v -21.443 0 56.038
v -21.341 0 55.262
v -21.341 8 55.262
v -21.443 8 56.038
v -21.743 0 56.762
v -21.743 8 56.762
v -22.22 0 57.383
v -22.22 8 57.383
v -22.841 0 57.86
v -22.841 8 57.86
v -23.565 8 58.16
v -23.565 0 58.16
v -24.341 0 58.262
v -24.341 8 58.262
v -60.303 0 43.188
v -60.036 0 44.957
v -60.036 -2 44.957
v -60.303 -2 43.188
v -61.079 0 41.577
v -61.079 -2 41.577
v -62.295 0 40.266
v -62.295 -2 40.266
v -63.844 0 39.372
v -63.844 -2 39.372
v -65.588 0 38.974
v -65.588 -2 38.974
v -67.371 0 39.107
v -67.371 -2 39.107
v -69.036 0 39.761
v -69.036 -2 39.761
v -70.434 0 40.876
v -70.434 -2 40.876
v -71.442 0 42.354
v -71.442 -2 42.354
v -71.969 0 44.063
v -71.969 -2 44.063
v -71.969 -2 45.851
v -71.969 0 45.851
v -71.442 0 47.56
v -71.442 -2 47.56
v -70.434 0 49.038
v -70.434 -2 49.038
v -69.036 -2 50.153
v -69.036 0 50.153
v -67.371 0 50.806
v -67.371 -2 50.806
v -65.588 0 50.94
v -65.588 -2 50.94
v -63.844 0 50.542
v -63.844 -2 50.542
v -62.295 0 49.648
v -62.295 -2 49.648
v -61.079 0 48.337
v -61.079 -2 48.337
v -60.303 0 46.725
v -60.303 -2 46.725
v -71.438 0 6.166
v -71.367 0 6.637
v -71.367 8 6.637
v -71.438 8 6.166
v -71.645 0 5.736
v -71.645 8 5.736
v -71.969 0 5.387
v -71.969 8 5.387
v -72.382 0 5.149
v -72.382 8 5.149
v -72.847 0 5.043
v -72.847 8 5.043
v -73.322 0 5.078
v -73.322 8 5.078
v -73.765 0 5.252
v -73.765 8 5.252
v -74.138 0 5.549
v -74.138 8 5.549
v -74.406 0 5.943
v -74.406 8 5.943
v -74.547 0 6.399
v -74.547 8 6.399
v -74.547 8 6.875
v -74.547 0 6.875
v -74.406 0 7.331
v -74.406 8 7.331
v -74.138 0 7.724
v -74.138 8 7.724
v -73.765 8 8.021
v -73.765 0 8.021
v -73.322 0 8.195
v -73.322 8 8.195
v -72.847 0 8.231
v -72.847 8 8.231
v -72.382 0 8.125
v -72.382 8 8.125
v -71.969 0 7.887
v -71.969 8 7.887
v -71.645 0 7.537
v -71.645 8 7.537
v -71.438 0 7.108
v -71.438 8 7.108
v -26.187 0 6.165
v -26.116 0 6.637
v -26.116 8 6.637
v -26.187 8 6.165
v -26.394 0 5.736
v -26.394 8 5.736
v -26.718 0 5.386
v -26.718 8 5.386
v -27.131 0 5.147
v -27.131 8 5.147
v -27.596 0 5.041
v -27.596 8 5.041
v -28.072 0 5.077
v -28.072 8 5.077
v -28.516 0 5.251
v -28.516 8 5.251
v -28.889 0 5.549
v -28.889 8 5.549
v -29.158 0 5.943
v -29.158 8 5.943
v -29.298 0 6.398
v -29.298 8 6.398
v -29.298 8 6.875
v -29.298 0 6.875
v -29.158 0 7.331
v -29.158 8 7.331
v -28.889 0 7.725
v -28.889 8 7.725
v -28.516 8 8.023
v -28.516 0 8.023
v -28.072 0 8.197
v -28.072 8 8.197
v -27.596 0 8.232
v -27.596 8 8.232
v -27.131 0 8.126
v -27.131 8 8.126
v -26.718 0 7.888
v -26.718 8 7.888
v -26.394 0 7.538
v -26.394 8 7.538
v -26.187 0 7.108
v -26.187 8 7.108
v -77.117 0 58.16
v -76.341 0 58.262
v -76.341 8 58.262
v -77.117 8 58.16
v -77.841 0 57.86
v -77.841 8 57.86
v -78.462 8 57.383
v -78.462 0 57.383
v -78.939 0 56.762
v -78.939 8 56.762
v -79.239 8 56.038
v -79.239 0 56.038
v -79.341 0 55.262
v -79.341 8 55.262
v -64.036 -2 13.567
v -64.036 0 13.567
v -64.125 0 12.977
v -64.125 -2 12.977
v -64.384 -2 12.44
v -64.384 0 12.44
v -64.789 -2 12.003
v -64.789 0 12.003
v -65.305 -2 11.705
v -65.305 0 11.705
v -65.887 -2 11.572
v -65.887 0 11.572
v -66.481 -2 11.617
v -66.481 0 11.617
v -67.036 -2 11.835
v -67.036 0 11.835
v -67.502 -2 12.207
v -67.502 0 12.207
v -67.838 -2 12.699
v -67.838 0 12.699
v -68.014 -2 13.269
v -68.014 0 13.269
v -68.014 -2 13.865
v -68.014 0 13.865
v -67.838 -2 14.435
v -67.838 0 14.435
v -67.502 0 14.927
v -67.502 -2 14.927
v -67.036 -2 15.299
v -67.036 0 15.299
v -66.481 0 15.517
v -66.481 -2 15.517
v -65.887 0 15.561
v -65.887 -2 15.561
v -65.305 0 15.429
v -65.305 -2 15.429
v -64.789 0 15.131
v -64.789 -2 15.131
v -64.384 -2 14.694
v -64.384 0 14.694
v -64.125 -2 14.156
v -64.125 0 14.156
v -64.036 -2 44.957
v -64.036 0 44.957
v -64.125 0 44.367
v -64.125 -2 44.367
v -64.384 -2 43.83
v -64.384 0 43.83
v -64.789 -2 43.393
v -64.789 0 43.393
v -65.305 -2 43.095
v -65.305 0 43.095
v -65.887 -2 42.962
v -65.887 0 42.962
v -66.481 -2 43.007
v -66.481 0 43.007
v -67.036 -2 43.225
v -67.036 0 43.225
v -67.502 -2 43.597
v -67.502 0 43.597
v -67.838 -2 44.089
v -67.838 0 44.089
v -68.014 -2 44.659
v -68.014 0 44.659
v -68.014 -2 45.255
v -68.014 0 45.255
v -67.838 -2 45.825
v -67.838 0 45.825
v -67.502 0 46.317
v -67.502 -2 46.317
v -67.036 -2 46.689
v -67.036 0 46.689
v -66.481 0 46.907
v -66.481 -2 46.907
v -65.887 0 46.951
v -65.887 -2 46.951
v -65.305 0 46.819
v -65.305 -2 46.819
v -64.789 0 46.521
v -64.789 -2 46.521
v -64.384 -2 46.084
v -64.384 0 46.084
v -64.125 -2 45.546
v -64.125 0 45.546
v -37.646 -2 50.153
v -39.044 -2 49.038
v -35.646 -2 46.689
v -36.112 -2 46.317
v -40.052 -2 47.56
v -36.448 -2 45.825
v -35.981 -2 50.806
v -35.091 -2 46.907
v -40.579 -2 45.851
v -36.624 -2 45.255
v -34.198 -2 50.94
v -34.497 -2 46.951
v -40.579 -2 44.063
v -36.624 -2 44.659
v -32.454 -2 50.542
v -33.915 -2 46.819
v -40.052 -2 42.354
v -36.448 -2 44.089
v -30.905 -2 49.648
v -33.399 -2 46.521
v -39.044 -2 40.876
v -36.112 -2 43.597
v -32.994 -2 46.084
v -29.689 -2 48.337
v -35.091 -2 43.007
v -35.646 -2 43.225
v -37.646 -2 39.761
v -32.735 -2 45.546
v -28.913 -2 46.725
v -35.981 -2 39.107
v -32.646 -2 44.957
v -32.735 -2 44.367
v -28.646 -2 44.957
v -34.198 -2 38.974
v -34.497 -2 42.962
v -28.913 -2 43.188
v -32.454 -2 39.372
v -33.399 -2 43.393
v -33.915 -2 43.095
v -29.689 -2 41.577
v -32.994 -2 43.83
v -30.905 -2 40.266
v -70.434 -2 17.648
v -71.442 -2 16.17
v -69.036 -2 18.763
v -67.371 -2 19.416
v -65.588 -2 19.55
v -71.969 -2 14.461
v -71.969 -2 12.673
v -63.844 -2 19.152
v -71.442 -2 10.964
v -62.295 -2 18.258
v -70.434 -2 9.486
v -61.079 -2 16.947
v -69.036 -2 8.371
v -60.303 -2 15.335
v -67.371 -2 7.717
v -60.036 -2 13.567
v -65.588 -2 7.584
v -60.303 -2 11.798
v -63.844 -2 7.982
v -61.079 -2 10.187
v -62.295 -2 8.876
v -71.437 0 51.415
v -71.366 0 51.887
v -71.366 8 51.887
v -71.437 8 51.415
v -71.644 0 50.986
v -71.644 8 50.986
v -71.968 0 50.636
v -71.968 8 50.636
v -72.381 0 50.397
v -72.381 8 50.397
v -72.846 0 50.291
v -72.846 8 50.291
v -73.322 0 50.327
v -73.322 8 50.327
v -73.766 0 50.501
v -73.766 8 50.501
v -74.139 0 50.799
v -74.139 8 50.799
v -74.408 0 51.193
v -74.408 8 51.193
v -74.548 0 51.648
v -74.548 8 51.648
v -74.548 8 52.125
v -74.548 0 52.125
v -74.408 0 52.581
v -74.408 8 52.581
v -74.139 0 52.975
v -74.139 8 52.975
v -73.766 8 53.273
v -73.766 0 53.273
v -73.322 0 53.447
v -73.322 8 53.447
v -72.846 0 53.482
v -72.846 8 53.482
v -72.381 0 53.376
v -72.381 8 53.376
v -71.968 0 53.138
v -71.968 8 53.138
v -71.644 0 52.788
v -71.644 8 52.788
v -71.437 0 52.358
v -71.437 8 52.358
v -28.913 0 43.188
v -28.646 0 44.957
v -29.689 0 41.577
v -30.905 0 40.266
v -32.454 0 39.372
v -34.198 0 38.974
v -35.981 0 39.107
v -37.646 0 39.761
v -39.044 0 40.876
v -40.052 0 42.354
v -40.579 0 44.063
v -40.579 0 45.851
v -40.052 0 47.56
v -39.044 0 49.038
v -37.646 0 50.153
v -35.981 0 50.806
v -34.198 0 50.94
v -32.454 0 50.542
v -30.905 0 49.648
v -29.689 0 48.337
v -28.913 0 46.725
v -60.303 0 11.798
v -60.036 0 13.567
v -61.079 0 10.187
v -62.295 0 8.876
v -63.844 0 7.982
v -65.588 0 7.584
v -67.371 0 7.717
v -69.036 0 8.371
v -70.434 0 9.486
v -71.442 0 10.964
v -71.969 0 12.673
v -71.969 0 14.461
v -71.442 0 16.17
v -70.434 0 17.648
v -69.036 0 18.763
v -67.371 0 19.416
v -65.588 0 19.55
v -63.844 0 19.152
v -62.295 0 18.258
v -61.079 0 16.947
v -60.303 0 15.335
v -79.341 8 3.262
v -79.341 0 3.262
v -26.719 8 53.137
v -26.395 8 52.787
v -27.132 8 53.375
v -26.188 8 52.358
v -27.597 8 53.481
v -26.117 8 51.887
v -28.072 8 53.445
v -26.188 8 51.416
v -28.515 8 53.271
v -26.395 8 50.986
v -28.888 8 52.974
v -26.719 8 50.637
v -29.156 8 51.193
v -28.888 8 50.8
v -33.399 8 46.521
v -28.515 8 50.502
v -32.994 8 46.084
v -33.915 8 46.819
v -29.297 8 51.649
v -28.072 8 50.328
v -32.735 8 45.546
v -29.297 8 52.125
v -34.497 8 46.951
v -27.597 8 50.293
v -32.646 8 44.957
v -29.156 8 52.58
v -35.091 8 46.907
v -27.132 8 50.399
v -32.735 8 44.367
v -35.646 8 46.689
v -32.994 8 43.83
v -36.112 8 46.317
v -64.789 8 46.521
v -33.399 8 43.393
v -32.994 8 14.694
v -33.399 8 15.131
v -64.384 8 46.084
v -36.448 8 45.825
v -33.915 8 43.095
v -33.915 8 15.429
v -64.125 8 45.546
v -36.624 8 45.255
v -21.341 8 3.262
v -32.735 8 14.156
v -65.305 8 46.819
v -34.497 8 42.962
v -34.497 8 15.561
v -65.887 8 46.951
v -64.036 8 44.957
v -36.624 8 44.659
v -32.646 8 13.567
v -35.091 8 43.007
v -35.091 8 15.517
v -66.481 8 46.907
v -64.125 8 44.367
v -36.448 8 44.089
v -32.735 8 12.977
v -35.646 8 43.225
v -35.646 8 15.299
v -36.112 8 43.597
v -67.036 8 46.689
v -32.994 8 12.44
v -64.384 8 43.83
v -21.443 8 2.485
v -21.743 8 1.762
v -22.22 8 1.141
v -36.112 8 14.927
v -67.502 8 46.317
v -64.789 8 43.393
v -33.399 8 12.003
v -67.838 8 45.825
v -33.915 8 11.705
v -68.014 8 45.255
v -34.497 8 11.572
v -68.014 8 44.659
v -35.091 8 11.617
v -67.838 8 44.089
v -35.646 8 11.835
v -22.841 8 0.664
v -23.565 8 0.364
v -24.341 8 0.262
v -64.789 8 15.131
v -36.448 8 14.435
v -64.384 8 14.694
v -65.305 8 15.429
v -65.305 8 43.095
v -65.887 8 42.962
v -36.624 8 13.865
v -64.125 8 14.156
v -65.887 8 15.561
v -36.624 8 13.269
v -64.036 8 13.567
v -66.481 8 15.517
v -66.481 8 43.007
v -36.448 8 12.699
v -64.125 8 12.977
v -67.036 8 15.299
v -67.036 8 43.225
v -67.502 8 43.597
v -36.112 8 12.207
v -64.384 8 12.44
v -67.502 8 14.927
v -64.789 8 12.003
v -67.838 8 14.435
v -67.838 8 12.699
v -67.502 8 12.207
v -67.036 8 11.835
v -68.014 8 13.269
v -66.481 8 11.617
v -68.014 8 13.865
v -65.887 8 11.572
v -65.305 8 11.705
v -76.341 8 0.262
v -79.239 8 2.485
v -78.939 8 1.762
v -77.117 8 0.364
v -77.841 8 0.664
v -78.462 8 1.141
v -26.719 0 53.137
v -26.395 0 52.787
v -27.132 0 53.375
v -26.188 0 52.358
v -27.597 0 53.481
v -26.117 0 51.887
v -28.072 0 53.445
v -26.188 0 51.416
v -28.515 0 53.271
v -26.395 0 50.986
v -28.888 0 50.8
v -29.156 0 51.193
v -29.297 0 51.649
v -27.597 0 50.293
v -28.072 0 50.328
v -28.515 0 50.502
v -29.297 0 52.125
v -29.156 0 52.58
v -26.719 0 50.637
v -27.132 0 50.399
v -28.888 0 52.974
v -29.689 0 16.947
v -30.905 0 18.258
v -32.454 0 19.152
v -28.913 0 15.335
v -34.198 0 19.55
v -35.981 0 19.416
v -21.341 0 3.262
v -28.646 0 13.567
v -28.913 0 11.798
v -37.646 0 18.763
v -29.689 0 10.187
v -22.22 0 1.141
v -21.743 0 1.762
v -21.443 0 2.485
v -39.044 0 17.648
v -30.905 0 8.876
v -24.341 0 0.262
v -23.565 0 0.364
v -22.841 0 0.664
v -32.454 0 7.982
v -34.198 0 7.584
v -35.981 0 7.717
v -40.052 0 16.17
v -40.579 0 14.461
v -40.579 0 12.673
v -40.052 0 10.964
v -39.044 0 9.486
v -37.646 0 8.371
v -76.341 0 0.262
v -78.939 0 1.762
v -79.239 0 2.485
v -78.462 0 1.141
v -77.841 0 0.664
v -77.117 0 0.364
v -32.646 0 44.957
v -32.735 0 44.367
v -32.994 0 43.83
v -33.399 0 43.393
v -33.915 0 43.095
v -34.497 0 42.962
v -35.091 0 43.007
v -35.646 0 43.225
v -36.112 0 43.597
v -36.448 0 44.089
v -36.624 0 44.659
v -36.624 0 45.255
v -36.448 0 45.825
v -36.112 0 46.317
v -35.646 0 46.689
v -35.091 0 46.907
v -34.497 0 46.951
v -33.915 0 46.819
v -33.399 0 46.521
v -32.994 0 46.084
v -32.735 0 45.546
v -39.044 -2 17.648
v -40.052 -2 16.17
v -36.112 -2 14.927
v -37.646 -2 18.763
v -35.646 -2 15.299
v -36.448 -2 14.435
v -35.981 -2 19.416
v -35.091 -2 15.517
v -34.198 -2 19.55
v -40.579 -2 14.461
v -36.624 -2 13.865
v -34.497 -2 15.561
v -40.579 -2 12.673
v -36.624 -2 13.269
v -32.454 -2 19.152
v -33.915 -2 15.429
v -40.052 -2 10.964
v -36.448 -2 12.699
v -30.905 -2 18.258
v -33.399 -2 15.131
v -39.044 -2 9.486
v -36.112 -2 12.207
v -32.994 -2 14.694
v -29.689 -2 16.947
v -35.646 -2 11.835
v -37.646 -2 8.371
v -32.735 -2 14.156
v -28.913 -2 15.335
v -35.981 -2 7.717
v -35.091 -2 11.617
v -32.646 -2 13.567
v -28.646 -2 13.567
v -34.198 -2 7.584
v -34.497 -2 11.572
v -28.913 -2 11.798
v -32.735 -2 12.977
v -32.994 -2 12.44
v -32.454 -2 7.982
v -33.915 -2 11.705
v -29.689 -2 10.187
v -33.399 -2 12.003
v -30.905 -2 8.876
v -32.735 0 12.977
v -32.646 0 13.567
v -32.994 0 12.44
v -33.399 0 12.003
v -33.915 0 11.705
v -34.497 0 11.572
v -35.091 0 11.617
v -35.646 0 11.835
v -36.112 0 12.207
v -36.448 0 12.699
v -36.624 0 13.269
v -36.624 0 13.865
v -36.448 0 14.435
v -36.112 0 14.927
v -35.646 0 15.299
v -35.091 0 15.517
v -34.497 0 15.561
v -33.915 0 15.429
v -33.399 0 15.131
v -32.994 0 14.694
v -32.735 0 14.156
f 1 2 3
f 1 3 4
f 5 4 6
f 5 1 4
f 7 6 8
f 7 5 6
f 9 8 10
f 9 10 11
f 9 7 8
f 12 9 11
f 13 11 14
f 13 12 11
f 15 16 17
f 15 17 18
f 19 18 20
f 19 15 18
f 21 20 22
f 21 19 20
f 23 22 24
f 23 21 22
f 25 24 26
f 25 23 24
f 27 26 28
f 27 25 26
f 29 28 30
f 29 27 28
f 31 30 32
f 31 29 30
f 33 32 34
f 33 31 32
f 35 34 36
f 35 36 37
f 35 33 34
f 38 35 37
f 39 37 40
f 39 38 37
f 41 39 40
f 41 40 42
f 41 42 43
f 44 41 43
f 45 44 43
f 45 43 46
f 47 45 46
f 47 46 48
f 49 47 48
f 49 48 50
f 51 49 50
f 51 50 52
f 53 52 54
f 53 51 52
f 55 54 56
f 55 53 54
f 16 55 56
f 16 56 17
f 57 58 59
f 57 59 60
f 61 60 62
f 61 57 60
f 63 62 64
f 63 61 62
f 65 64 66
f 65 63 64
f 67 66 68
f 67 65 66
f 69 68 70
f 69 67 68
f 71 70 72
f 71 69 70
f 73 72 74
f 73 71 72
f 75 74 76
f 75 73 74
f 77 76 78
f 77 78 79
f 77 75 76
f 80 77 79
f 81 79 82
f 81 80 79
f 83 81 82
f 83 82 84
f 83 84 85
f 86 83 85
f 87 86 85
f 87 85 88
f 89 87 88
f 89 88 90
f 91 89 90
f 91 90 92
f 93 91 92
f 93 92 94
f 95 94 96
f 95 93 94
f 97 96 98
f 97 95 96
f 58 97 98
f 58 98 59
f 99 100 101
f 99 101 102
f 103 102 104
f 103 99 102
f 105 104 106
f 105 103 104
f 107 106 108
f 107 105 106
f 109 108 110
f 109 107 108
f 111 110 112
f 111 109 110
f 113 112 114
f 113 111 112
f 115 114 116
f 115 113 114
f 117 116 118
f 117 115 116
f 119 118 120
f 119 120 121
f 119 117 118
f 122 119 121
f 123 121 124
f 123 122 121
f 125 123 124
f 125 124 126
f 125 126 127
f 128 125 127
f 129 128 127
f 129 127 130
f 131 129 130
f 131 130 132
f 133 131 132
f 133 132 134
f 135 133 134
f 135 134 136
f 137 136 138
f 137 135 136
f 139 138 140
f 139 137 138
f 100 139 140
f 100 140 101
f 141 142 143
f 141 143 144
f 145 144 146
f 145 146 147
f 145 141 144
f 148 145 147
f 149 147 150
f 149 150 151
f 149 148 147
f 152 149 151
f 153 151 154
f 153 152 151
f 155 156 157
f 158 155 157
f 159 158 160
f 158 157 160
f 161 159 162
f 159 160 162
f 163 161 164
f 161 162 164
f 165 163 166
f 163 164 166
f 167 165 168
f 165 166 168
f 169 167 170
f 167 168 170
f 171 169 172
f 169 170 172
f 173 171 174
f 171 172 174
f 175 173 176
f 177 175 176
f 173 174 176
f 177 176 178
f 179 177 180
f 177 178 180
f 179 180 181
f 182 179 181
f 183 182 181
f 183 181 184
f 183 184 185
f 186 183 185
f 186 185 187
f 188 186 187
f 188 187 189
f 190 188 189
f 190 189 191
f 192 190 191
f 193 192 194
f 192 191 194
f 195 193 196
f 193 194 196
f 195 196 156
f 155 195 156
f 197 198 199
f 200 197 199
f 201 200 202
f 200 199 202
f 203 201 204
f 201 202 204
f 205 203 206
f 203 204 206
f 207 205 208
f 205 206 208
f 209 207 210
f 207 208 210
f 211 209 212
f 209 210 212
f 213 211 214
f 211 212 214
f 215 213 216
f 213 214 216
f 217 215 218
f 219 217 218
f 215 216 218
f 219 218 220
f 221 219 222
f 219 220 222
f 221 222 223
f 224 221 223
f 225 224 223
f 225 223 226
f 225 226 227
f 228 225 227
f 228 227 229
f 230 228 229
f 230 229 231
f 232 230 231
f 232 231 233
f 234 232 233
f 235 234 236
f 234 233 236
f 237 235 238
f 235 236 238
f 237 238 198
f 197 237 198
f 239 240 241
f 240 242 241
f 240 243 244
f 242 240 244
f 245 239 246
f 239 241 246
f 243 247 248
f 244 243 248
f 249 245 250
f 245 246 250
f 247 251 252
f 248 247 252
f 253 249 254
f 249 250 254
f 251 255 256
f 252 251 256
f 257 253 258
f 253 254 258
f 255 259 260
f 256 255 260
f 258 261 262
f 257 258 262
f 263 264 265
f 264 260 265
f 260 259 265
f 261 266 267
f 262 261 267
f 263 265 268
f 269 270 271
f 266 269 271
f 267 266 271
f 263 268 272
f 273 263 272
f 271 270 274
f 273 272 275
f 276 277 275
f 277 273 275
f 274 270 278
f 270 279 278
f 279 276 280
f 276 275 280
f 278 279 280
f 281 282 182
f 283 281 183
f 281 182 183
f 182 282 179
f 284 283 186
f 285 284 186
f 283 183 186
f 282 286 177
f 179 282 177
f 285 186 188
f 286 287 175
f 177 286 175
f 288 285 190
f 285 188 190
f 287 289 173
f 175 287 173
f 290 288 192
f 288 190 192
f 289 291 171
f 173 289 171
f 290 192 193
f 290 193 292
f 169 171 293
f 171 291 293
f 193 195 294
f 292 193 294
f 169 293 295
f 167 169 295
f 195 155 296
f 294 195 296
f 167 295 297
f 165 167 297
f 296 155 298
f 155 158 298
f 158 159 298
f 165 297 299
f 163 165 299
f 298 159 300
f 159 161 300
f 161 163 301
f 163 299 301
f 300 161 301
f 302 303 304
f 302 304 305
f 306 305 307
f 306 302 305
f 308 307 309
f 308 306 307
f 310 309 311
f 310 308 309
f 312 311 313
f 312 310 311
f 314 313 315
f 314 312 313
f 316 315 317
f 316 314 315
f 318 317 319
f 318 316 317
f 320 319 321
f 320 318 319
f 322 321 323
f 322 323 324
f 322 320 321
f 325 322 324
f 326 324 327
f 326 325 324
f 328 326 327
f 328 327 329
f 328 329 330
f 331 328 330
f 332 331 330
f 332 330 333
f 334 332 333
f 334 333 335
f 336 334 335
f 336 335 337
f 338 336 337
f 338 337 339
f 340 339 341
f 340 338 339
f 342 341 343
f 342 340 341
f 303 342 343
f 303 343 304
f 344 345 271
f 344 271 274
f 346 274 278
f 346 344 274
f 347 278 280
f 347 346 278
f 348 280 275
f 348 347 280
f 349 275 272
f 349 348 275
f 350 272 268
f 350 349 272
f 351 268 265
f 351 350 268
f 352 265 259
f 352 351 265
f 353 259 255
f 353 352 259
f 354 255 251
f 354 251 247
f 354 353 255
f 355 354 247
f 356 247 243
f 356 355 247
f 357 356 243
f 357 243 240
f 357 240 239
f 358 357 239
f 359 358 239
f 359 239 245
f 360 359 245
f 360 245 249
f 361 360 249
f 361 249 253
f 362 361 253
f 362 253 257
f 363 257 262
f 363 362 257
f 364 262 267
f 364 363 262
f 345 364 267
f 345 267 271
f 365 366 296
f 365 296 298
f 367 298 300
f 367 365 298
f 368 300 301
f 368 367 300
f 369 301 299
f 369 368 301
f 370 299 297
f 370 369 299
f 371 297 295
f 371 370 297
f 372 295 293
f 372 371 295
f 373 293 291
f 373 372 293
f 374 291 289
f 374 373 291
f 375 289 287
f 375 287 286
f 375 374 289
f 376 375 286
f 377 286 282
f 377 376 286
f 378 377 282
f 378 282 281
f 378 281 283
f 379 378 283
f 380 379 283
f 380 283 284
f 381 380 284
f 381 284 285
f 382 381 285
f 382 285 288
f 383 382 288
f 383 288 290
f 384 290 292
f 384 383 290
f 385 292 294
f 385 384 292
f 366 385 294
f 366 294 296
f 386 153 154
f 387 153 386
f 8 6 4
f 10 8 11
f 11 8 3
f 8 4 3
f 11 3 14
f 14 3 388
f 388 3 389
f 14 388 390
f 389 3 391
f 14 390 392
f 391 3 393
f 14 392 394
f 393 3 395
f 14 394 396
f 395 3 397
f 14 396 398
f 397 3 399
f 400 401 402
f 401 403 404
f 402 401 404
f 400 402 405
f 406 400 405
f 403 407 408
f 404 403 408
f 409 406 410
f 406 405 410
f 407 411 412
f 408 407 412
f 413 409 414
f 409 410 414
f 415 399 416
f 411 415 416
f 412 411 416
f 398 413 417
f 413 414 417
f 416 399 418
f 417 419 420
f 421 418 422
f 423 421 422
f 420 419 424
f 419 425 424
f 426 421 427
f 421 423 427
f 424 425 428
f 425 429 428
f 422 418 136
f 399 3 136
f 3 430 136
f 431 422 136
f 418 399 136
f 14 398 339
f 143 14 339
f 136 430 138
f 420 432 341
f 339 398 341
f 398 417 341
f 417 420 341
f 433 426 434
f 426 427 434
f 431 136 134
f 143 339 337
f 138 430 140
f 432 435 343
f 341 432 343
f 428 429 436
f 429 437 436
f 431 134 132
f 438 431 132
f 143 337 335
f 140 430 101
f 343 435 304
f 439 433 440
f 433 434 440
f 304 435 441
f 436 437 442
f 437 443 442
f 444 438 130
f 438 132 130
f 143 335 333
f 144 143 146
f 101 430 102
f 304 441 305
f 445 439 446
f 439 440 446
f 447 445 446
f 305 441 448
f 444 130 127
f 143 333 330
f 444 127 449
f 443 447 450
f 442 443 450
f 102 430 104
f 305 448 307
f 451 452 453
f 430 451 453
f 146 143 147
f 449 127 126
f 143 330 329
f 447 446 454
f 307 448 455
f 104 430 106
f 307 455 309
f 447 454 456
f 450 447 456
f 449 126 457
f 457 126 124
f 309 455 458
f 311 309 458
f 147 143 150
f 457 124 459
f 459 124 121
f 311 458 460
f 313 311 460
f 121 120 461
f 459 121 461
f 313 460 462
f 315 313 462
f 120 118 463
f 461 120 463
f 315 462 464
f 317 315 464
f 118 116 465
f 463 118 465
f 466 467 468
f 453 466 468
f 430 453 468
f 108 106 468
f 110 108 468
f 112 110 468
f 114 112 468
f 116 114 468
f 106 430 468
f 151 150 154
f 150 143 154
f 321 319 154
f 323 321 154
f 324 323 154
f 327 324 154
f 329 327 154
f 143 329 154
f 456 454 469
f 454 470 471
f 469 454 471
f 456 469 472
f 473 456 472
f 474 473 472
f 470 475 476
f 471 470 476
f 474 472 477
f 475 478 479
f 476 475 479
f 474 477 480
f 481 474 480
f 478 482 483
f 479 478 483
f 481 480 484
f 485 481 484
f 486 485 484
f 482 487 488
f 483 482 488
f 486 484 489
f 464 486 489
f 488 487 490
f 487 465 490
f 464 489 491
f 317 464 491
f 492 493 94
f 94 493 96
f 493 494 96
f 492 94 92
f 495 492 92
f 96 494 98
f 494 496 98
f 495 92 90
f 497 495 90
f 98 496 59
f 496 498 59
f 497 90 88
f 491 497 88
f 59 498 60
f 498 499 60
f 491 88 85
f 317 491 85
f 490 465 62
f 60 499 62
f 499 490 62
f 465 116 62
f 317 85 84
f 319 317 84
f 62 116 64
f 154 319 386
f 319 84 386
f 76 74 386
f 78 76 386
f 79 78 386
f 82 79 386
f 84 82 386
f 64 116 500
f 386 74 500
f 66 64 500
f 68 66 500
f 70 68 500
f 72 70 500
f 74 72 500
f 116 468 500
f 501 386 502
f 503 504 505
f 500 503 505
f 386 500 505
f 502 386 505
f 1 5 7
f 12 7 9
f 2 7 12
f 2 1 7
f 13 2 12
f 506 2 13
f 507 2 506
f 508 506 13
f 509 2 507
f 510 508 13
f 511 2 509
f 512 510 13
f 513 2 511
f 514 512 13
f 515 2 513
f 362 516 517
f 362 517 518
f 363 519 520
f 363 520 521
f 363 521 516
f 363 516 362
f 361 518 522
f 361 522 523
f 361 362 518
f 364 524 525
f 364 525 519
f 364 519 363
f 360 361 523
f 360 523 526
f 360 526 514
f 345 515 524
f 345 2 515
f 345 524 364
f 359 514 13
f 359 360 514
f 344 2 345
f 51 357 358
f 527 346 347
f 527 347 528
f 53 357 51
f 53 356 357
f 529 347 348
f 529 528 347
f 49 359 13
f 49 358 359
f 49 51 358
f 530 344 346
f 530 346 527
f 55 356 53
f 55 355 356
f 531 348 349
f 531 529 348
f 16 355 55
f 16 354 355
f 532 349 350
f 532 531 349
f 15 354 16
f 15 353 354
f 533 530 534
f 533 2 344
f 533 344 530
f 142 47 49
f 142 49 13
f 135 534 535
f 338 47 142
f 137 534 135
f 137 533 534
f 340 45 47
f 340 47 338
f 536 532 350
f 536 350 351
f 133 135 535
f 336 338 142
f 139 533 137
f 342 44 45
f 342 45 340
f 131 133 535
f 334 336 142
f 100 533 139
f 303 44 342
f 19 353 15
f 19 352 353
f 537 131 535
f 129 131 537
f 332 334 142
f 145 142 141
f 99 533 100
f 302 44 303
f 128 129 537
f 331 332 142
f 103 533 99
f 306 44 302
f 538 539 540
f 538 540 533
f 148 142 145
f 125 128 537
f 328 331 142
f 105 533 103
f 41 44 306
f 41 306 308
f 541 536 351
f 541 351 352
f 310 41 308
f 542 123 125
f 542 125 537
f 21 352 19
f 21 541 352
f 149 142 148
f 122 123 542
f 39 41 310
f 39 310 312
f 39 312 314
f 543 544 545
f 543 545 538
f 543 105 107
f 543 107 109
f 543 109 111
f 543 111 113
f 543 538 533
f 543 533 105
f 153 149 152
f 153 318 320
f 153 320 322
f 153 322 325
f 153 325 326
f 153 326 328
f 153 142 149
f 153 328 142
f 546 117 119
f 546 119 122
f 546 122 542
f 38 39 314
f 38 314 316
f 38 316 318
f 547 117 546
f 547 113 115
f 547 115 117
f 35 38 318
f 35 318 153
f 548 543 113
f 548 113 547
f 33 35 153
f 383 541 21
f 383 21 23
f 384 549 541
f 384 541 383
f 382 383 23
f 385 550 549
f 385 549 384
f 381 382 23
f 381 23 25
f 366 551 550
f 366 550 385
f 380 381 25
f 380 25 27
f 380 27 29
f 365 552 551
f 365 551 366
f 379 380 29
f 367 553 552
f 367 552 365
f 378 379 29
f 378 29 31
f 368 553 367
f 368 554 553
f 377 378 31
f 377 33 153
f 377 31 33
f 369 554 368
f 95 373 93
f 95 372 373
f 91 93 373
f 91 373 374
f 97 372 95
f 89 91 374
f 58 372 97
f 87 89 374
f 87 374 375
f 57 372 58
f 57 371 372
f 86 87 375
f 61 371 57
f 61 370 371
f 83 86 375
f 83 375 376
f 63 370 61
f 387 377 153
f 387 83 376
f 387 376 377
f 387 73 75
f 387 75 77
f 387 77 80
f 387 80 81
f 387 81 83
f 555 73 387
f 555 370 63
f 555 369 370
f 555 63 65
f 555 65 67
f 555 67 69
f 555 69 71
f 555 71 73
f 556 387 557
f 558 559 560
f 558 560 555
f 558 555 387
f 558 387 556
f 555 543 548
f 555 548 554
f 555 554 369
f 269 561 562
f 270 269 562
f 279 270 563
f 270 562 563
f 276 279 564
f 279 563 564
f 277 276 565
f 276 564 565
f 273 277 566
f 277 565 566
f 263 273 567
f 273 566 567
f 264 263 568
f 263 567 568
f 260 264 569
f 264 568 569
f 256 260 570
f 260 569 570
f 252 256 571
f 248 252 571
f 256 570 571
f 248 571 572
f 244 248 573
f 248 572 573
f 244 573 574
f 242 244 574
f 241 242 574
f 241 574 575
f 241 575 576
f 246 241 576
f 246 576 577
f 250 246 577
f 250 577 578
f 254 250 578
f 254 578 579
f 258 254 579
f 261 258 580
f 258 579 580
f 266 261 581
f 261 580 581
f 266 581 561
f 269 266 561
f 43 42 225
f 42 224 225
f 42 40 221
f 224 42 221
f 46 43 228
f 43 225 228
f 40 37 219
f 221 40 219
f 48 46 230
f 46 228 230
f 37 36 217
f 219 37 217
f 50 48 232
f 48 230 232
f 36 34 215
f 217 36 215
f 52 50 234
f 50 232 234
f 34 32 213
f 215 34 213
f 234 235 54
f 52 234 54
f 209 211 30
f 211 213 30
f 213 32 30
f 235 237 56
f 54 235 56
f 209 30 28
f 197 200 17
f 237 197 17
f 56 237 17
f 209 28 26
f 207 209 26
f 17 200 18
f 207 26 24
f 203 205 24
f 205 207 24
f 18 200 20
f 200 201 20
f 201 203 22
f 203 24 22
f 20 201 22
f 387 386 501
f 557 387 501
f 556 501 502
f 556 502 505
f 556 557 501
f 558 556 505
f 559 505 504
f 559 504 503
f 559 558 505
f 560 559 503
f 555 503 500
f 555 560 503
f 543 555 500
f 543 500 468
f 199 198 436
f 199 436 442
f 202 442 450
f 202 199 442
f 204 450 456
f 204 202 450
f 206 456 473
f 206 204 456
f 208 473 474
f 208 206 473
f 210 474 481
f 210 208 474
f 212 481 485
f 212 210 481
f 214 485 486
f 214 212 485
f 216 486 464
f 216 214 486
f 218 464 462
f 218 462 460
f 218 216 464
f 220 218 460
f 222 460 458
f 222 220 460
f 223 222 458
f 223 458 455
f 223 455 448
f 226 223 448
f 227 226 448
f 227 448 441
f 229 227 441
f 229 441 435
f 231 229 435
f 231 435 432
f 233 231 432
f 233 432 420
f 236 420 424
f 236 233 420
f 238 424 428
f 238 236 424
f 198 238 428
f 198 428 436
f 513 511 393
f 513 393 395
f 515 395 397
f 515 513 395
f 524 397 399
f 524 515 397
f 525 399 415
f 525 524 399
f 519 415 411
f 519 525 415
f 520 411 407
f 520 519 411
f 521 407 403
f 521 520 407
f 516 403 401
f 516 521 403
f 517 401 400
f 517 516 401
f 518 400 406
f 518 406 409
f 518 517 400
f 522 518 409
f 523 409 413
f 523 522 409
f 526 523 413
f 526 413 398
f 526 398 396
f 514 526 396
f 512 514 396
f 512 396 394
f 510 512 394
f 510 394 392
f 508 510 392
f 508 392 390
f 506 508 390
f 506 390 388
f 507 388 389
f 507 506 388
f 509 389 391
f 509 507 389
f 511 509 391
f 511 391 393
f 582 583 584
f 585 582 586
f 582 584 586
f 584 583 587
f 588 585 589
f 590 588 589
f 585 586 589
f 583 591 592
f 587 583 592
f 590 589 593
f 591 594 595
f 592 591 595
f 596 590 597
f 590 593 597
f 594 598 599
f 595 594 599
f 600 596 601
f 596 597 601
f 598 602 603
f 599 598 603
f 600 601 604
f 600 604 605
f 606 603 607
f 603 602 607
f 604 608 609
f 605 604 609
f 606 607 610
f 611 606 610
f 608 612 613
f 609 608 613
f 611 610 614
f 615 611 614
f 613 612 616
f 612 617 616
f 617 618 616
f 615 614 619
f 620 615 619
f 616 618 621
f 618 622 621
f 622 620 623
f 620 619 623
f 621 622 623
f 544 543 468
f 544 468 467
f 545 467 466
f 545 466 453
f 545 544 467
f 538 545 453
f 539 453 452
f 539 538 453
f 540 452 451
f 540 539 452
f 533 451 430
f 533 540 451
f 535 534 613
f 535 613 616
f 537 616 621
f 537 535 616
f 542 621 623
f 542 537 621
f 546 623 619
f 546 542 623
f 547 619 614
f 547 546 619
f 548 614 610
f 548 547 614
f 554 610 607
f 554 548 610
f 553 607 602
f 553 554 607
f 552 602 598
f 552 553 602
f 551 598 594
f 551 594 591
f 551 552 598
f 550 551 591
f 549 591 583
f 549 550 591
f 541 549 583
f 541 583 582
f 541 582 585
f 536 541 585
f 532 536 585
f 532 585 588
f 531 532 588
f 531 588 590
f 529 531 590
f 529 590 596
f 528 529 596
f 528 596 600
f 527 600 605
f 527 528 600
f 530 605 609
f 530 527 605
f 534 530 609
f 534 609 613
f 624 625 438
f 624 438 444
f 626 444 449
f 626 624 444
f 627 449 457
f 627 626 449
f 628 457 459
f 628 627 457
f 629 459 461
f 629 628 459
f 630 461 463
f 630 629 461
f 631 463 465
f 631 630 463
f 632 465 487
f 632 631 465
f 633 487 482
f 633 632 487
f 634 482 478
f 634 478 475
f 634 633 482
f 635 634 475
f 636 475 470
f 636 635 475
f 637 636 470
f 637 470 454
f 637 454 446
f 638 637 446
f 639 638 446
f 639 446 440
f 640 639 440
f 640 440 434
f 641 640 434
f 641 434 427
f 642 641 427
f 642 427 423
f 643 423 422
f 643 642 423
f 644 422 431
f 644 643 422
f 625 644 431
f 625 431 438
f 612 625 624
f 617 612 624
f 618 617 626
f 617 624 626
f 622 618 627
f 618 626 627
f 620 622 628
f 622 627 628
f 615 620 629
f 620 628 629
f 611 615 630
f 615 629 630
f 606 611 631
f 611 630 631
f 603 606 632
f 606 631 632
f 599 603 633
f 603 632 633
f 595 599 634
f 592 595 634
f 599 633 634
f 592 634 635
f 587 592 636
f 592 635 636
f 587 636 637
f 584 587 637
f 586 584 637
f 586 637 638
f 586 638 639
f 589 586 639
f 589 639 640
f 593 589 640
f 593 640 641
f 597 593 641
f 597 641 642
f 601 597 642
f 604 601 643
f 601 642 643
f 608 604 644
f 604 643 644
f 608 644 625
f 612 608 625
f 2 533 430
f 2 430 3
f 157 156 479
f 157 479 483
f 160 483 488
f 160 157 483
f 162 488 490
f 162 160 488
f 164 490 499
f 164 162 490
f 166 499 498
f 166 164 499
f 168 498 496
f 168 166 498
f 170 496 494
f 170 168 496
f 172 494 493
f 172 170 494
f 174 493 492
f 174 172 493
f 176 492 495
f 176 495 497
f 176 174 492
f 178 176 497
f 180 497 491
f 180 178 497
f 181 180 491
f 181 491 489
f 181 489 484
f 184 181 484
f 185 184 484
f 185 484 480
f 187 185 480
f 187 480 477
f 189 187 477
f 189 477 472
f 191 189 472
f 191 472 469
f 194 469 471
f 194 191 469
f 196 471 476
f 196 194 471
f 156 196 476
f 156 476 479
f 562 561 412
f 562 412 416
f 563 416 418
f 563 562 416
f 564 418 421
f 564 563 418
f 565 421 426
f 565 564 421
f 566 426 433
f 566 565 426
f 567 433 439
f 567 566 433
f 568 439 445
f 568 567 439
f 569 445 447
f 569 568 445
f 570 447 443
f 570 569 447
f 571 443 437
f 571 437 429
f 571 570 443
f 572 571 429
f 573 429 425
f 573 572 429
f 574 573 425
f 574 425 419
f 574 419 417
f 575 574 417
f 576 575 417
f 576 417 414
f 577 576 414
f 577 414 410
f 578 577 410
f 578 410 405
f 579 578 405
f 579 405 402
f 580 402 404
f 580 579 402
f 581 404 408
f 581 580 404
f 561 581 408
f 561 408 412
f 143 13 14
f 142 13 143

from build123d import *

# Parameters (mm, degrees)
SZKIC2_R                    = 1.6
SZKIC2_R_2                  = 1.598649761
SZKIC2_R_3                  = 1.598671199
SZKIC2_R_4                  = 2
DODANIE_WYCI_GNI_CIE1_DEPTH = 8
DODANIE_WYCI_GNI_CIE2_START = -2
SZKIC2_3_R                  = 6
SZKIC2_3_R_2                = 2
DODANIE_WYCI_GNI_CIE2_DEPTH = 2


with BuildPart() as part:
    # Szkic2 → Dodanie-wyci_gni_cie1 (new body)
    with BuildSketch(Plane(origin=(0, 0, 0), x_dir=(1, 0, 0), z_dir=(0, 1, 0))):
        with BuildLine():
            ThreePointArc((-79.341028527, -55.261863724), (-78.46234887, -57.383184068), (-76.341028527, -58.261863724))
            Line((-76.341028527, -58.261863724), (-24.341028527, -58.261863724))
            ThreePointArc((-24.341028527, -58.261863724), (-22.219708183, -57.383184068), (-21.341028527, -55.261863724))
            Line((-21.341028527, -55.261863724), (-21.341028527, -3.261863724))
            ThreePointArc((-21.341028527, -3.261863724), (-22.219708183, -1.140543381), (-24.341028527, -0.261863724))
            Line((-24.341028527, -0.261863724), (-76.341028527, -0.261863724))
            ThreePointArc((-76.341028527, -0.261863724), (-78.46234887, -1.140543381), (-79.341028527, -3.261863724))
            Line((-79.341028527, -3.261863724), (-79.341028527, -55.261863724))
        make_face()
        with Locations((-72.966028527, -51.886863724)):
            Circle(SZKIC2_R, mode=Mode.SUBTRACT)
        with Locations((-27.716028527, -51.886863724)):
            Circle(SZKIC2_R_2, mode=Mode.SUBTRACT)
        with Locations((-72.966028527, -6.636863724)):
            Circle(SZKIC2_R_3, mode=Mode.SUBTRACT)
        with Locations((-27.716028527, -6.636863724)):
            Circle(SZKIC2_R, mode=Mode.SUBTRACT)
        with Locations((-66.036028527, -44.956863724)):
            Circle(SZKIC2_R_4, mode=Mode.SUBTRACT)
        with Locations((-34.646028527, -44.956863724)):
            Circle(SZKIC2_R_4, mode=Mode.SUBTRACT)
        with Locations((-66.036028527, -13.566863724)):
            Circle(SZKIC2_R_4, mode=Mode.SUBTRACT)
        with Locations((-34.646028527, -13.566863724)):
            Circle(SZKIC2_R_4, mode=Mode.SUBTRACT)
    extrude(amount=DODANIE_WYCI_GNI_CIE1_DEPTH)

    # Szkic2_3 → Dodanie-wyci_gni_cie2 (add)
    # profile 1 of 4: a face of its own
    with BuildSketch(Plane(origin=(0, 0, 0), x_dir=(1, 0, 0), z_dir=(0, 1, 0)).offset(DODANIE_WYCI_GNI_CIE2_START)):
        with Locations((-66.036028527, -13.566863724)):
            Circle(SZKIC2_3_R)
        with Locations((-66.036028527, -13.566863724)):
            Circle(SZKIC2_3_R_2, mode=Mode.SUBTRACT)
    # profile 2 of 4: a face of its own
    with BuildSketch(Plane(origin=(0, 0, 0), x_dir=(1, 0, 0), z_dir=(0, 1, 0)).offset(DODANIE_WYCI_GNI_CIE2_START)):
        with Locations((-34.646028527, -13.566863724)):
            Circle(SZKIC2_3_R)
        with Locations((-34.646028527, -13.566863724)):
            Circle(SZKIC2_3_R_2, mode=Mode.SUBTRACT)
    # profile 3 of 4: a face of its own
    with BuildSketch(Plane(origin=(0, 0, 0), x_dir=(1, 0, 0), z_dir=(0, 1, 0)).offset(DODANIE_WYCI_GNI_CIE2_START)):
        with Locations((-66.036028527, -44.956863724)):
            Circle(SZKIC2_3_R)
        with Locations((-66.036028527, -44.956863724)):
            Circle(SZKIC2_3_R_2, mode=Mode.SUBTRACT)
    # profile 4 of 4: a face of its own
    with BuildSketch(Plane(origin=(0, 0, 0), x_dir=(1, 0, 0), z_dir=(0, 1, 0)).offset(DODANIE_WYCI_GNI_CIE2_START)):
        with Locations((-34.646028527, -44.956863724)):
            Circle(SZKIC2_3_R)
        with Locations((-34.646028527, -44.956863724)):
            Circle(SZKIC2_3_R_2, mode=Mode.SUBTRACT)
    extrude(amount=DODANIE_WYCI_GNI_CIE2_DEPTH)


solid = part.part
